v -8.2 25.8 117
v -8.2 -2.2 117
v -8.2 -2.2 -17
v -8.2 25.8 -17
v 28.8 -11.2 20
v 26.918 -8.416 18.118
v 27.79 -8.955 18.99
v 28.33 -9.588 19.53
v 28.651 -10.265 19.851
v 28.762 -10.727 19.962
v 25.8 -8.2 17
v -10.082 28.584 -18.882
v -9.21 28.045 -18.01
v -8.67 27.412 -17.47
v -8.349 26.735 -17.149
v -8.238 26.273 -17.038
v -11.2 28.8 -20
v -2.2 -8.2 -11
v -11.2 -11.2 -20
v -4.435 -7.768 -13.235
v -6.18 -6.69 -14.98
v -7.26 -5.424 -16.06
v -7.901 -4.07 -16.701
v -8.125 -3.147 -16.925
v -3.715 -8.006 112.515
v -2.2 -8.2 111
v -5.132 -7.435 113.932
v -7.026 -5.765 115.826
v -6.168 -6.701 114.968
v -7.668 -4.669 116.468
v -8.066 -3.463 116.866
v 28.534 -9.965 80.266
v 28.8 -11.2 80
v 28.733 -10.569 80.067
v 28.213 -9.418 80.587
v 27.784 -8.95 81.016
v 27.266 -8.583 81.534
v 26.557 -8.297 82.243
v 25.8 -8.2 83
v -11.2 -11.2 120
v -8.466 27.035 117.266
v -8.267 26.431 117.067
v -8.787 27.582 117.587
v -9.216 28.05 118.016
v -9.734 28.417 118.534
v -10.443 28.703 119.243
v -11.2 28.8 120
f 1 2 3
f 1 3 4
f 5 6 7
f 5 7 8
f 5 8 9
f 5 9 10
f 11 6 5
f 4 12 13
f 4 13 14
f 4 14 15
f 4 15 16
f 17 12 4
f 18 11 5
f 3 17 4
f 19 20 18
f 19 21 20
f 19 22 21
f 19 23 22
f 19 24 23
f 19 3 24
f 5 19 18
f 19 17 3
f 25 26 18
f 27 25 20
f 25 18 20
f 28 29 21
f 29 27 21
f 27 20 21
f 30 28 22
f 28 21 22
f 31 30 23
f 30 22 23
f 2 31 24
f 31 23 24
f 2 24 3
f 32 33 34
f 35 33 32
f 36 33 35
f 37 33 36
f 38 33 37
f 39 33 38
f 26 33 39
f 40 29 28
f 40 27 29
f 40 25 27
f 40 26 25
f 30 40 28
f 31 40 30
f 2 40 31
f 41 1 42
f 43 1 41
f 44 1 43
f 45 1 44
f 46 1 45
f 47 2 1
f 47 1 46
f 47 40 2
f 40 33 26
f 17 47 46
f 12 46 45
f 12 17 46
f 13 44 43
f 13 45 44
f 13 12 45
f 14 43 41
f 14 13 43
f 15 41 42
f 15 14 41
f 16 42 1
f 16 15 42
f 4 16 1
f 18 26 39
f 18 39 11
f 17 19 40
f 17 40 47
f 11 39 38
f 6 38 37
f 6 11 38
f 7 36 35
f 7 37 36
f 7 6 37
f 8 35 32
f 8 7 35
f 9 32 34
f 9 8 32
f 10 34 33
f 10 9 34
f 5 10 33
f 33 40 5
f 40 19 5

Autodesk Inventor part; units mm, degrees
ref_plane "Start plane" through (0, 0, -20) normal (0, 0, 1) x (1, 0, 0)
ref_plane "End plane" through (0, 0, 120) normal (0, 0, 1) x (1, 0, 0)
sketch "Sketch2" plane through (0, 0, 0) normal (0, 0, 1) x (1, 0, 0)
  line L0 (-8.2, -2.2) -> (-8.2, 25.8)
  line L1 (-11.2, 28.8) -> (-11.2, 28.8)
  line L2 (-11.2, -11.2) -> (-11.2, 28.8)
  line L3 (-11.2, -11.2) -> (28.8, -11.2)
  line L4 (28.8, -11.2) -> (28.8, -11.2)
  line L5 (-2.2, -8.2) -> (25.8, -8.2)
  arc A0 (-8.2, -2.2) -> (-2.2, -8.2) centre (-2.2, -2.2) ccw
  arc A1 (-8.2, 25.8) -> (-11.2, 28.8) centre (-11.2, 25.8) ccw
  arc A2 (28.8, -11.2) -> (25.8, -8.2) centre (25.8, -11.2) ccw
  line L6 (0, 37.5456) -> (0, -19.3243) construction
  line L7 (-19.3243, 0) -> (37.5456, 0) construction
  point P0 (-8.2, -8.2)
  point P1 (-8.2, 28.8)
  point P2 (28.8, -8.2)
  dimension "d4" = 40
  dimension "d6" = 40
  dimension "d8" = 3
  dimension "d10" = 3
  dimension "d17" = 6
  dimension "d18" = 3
  dimension "d19" = 11.2
  dimension "d20" = 11.2
extrude "Body" add sketch "Sketch2" along normal up to surface (140 mm away) from surface at -20
sketch "Sketch3" plane through (0, 0, 0) normal (0, 0, 1) x (1, 0, 0)
  line L0 (0, 0) -> (10, 0)
ref_plane "Work Plane10" through (0, 0, 0) normal (0, -1, 0) x (1, 0, 0)
sketch "Sketch4" plane through (0, 0, 0) normal (0, -1, 0) x (1, 0, 0)
  line L0 (-2, -20) -> (12, -20)
  line L1 (-2, 120) -> (12, 120)
  dimension "d24" = 140
ref_plane "Work Plane11" through (-11.2, 8.8, -20) normal (0.7071, 0, -0.7071) x (-0.7071, 0, -0.7071)
split "Split1" plane through (-11.2, 8.8, -20) removes the side toward (0.7071, 0, -0.7071)
ref_plane "Work Plane12" through (-11.2, 8.8, 120) normal (0.7071, 0, 0.7071) x (0.7071, 0, -0.7071)
split "Split2" plane through (-11.2, 8.8, 120) removes the side toward (0.7071, 0, 0.7071)
equation "\"d4\" = b"
equation "\"d6\" = b"
equation "\"d8\" = ParT"
equation "\"d10\" = ParT"
equation "\"d17\" = R"
equation "\"d18\" = R1"
equation "\"d19\" = ex"
equation "\"d20\" = d19"
equation "\"d11\" = G_L"
equation "\"b\" = 40"
equation "\"ParT\" = 3"
equation "\"R\" = 6"
equation "\"R1\" = 3"
equation "\"G_L\" = d24"
equation "\"ex\" = 11.2"
equation "\"G_OFFSET_START\" = 20"
equation "\"G_OFFSET_END\" = 20"
equation "\"d21\" = -G_OFFSET_START"
equation "\"d22\" = G_OFFSET_END + B_L"
equation "\"B_L\" = 100"
properties part number "ISO 657-1 - L40x40x3-140" material "Steel, Mild"
